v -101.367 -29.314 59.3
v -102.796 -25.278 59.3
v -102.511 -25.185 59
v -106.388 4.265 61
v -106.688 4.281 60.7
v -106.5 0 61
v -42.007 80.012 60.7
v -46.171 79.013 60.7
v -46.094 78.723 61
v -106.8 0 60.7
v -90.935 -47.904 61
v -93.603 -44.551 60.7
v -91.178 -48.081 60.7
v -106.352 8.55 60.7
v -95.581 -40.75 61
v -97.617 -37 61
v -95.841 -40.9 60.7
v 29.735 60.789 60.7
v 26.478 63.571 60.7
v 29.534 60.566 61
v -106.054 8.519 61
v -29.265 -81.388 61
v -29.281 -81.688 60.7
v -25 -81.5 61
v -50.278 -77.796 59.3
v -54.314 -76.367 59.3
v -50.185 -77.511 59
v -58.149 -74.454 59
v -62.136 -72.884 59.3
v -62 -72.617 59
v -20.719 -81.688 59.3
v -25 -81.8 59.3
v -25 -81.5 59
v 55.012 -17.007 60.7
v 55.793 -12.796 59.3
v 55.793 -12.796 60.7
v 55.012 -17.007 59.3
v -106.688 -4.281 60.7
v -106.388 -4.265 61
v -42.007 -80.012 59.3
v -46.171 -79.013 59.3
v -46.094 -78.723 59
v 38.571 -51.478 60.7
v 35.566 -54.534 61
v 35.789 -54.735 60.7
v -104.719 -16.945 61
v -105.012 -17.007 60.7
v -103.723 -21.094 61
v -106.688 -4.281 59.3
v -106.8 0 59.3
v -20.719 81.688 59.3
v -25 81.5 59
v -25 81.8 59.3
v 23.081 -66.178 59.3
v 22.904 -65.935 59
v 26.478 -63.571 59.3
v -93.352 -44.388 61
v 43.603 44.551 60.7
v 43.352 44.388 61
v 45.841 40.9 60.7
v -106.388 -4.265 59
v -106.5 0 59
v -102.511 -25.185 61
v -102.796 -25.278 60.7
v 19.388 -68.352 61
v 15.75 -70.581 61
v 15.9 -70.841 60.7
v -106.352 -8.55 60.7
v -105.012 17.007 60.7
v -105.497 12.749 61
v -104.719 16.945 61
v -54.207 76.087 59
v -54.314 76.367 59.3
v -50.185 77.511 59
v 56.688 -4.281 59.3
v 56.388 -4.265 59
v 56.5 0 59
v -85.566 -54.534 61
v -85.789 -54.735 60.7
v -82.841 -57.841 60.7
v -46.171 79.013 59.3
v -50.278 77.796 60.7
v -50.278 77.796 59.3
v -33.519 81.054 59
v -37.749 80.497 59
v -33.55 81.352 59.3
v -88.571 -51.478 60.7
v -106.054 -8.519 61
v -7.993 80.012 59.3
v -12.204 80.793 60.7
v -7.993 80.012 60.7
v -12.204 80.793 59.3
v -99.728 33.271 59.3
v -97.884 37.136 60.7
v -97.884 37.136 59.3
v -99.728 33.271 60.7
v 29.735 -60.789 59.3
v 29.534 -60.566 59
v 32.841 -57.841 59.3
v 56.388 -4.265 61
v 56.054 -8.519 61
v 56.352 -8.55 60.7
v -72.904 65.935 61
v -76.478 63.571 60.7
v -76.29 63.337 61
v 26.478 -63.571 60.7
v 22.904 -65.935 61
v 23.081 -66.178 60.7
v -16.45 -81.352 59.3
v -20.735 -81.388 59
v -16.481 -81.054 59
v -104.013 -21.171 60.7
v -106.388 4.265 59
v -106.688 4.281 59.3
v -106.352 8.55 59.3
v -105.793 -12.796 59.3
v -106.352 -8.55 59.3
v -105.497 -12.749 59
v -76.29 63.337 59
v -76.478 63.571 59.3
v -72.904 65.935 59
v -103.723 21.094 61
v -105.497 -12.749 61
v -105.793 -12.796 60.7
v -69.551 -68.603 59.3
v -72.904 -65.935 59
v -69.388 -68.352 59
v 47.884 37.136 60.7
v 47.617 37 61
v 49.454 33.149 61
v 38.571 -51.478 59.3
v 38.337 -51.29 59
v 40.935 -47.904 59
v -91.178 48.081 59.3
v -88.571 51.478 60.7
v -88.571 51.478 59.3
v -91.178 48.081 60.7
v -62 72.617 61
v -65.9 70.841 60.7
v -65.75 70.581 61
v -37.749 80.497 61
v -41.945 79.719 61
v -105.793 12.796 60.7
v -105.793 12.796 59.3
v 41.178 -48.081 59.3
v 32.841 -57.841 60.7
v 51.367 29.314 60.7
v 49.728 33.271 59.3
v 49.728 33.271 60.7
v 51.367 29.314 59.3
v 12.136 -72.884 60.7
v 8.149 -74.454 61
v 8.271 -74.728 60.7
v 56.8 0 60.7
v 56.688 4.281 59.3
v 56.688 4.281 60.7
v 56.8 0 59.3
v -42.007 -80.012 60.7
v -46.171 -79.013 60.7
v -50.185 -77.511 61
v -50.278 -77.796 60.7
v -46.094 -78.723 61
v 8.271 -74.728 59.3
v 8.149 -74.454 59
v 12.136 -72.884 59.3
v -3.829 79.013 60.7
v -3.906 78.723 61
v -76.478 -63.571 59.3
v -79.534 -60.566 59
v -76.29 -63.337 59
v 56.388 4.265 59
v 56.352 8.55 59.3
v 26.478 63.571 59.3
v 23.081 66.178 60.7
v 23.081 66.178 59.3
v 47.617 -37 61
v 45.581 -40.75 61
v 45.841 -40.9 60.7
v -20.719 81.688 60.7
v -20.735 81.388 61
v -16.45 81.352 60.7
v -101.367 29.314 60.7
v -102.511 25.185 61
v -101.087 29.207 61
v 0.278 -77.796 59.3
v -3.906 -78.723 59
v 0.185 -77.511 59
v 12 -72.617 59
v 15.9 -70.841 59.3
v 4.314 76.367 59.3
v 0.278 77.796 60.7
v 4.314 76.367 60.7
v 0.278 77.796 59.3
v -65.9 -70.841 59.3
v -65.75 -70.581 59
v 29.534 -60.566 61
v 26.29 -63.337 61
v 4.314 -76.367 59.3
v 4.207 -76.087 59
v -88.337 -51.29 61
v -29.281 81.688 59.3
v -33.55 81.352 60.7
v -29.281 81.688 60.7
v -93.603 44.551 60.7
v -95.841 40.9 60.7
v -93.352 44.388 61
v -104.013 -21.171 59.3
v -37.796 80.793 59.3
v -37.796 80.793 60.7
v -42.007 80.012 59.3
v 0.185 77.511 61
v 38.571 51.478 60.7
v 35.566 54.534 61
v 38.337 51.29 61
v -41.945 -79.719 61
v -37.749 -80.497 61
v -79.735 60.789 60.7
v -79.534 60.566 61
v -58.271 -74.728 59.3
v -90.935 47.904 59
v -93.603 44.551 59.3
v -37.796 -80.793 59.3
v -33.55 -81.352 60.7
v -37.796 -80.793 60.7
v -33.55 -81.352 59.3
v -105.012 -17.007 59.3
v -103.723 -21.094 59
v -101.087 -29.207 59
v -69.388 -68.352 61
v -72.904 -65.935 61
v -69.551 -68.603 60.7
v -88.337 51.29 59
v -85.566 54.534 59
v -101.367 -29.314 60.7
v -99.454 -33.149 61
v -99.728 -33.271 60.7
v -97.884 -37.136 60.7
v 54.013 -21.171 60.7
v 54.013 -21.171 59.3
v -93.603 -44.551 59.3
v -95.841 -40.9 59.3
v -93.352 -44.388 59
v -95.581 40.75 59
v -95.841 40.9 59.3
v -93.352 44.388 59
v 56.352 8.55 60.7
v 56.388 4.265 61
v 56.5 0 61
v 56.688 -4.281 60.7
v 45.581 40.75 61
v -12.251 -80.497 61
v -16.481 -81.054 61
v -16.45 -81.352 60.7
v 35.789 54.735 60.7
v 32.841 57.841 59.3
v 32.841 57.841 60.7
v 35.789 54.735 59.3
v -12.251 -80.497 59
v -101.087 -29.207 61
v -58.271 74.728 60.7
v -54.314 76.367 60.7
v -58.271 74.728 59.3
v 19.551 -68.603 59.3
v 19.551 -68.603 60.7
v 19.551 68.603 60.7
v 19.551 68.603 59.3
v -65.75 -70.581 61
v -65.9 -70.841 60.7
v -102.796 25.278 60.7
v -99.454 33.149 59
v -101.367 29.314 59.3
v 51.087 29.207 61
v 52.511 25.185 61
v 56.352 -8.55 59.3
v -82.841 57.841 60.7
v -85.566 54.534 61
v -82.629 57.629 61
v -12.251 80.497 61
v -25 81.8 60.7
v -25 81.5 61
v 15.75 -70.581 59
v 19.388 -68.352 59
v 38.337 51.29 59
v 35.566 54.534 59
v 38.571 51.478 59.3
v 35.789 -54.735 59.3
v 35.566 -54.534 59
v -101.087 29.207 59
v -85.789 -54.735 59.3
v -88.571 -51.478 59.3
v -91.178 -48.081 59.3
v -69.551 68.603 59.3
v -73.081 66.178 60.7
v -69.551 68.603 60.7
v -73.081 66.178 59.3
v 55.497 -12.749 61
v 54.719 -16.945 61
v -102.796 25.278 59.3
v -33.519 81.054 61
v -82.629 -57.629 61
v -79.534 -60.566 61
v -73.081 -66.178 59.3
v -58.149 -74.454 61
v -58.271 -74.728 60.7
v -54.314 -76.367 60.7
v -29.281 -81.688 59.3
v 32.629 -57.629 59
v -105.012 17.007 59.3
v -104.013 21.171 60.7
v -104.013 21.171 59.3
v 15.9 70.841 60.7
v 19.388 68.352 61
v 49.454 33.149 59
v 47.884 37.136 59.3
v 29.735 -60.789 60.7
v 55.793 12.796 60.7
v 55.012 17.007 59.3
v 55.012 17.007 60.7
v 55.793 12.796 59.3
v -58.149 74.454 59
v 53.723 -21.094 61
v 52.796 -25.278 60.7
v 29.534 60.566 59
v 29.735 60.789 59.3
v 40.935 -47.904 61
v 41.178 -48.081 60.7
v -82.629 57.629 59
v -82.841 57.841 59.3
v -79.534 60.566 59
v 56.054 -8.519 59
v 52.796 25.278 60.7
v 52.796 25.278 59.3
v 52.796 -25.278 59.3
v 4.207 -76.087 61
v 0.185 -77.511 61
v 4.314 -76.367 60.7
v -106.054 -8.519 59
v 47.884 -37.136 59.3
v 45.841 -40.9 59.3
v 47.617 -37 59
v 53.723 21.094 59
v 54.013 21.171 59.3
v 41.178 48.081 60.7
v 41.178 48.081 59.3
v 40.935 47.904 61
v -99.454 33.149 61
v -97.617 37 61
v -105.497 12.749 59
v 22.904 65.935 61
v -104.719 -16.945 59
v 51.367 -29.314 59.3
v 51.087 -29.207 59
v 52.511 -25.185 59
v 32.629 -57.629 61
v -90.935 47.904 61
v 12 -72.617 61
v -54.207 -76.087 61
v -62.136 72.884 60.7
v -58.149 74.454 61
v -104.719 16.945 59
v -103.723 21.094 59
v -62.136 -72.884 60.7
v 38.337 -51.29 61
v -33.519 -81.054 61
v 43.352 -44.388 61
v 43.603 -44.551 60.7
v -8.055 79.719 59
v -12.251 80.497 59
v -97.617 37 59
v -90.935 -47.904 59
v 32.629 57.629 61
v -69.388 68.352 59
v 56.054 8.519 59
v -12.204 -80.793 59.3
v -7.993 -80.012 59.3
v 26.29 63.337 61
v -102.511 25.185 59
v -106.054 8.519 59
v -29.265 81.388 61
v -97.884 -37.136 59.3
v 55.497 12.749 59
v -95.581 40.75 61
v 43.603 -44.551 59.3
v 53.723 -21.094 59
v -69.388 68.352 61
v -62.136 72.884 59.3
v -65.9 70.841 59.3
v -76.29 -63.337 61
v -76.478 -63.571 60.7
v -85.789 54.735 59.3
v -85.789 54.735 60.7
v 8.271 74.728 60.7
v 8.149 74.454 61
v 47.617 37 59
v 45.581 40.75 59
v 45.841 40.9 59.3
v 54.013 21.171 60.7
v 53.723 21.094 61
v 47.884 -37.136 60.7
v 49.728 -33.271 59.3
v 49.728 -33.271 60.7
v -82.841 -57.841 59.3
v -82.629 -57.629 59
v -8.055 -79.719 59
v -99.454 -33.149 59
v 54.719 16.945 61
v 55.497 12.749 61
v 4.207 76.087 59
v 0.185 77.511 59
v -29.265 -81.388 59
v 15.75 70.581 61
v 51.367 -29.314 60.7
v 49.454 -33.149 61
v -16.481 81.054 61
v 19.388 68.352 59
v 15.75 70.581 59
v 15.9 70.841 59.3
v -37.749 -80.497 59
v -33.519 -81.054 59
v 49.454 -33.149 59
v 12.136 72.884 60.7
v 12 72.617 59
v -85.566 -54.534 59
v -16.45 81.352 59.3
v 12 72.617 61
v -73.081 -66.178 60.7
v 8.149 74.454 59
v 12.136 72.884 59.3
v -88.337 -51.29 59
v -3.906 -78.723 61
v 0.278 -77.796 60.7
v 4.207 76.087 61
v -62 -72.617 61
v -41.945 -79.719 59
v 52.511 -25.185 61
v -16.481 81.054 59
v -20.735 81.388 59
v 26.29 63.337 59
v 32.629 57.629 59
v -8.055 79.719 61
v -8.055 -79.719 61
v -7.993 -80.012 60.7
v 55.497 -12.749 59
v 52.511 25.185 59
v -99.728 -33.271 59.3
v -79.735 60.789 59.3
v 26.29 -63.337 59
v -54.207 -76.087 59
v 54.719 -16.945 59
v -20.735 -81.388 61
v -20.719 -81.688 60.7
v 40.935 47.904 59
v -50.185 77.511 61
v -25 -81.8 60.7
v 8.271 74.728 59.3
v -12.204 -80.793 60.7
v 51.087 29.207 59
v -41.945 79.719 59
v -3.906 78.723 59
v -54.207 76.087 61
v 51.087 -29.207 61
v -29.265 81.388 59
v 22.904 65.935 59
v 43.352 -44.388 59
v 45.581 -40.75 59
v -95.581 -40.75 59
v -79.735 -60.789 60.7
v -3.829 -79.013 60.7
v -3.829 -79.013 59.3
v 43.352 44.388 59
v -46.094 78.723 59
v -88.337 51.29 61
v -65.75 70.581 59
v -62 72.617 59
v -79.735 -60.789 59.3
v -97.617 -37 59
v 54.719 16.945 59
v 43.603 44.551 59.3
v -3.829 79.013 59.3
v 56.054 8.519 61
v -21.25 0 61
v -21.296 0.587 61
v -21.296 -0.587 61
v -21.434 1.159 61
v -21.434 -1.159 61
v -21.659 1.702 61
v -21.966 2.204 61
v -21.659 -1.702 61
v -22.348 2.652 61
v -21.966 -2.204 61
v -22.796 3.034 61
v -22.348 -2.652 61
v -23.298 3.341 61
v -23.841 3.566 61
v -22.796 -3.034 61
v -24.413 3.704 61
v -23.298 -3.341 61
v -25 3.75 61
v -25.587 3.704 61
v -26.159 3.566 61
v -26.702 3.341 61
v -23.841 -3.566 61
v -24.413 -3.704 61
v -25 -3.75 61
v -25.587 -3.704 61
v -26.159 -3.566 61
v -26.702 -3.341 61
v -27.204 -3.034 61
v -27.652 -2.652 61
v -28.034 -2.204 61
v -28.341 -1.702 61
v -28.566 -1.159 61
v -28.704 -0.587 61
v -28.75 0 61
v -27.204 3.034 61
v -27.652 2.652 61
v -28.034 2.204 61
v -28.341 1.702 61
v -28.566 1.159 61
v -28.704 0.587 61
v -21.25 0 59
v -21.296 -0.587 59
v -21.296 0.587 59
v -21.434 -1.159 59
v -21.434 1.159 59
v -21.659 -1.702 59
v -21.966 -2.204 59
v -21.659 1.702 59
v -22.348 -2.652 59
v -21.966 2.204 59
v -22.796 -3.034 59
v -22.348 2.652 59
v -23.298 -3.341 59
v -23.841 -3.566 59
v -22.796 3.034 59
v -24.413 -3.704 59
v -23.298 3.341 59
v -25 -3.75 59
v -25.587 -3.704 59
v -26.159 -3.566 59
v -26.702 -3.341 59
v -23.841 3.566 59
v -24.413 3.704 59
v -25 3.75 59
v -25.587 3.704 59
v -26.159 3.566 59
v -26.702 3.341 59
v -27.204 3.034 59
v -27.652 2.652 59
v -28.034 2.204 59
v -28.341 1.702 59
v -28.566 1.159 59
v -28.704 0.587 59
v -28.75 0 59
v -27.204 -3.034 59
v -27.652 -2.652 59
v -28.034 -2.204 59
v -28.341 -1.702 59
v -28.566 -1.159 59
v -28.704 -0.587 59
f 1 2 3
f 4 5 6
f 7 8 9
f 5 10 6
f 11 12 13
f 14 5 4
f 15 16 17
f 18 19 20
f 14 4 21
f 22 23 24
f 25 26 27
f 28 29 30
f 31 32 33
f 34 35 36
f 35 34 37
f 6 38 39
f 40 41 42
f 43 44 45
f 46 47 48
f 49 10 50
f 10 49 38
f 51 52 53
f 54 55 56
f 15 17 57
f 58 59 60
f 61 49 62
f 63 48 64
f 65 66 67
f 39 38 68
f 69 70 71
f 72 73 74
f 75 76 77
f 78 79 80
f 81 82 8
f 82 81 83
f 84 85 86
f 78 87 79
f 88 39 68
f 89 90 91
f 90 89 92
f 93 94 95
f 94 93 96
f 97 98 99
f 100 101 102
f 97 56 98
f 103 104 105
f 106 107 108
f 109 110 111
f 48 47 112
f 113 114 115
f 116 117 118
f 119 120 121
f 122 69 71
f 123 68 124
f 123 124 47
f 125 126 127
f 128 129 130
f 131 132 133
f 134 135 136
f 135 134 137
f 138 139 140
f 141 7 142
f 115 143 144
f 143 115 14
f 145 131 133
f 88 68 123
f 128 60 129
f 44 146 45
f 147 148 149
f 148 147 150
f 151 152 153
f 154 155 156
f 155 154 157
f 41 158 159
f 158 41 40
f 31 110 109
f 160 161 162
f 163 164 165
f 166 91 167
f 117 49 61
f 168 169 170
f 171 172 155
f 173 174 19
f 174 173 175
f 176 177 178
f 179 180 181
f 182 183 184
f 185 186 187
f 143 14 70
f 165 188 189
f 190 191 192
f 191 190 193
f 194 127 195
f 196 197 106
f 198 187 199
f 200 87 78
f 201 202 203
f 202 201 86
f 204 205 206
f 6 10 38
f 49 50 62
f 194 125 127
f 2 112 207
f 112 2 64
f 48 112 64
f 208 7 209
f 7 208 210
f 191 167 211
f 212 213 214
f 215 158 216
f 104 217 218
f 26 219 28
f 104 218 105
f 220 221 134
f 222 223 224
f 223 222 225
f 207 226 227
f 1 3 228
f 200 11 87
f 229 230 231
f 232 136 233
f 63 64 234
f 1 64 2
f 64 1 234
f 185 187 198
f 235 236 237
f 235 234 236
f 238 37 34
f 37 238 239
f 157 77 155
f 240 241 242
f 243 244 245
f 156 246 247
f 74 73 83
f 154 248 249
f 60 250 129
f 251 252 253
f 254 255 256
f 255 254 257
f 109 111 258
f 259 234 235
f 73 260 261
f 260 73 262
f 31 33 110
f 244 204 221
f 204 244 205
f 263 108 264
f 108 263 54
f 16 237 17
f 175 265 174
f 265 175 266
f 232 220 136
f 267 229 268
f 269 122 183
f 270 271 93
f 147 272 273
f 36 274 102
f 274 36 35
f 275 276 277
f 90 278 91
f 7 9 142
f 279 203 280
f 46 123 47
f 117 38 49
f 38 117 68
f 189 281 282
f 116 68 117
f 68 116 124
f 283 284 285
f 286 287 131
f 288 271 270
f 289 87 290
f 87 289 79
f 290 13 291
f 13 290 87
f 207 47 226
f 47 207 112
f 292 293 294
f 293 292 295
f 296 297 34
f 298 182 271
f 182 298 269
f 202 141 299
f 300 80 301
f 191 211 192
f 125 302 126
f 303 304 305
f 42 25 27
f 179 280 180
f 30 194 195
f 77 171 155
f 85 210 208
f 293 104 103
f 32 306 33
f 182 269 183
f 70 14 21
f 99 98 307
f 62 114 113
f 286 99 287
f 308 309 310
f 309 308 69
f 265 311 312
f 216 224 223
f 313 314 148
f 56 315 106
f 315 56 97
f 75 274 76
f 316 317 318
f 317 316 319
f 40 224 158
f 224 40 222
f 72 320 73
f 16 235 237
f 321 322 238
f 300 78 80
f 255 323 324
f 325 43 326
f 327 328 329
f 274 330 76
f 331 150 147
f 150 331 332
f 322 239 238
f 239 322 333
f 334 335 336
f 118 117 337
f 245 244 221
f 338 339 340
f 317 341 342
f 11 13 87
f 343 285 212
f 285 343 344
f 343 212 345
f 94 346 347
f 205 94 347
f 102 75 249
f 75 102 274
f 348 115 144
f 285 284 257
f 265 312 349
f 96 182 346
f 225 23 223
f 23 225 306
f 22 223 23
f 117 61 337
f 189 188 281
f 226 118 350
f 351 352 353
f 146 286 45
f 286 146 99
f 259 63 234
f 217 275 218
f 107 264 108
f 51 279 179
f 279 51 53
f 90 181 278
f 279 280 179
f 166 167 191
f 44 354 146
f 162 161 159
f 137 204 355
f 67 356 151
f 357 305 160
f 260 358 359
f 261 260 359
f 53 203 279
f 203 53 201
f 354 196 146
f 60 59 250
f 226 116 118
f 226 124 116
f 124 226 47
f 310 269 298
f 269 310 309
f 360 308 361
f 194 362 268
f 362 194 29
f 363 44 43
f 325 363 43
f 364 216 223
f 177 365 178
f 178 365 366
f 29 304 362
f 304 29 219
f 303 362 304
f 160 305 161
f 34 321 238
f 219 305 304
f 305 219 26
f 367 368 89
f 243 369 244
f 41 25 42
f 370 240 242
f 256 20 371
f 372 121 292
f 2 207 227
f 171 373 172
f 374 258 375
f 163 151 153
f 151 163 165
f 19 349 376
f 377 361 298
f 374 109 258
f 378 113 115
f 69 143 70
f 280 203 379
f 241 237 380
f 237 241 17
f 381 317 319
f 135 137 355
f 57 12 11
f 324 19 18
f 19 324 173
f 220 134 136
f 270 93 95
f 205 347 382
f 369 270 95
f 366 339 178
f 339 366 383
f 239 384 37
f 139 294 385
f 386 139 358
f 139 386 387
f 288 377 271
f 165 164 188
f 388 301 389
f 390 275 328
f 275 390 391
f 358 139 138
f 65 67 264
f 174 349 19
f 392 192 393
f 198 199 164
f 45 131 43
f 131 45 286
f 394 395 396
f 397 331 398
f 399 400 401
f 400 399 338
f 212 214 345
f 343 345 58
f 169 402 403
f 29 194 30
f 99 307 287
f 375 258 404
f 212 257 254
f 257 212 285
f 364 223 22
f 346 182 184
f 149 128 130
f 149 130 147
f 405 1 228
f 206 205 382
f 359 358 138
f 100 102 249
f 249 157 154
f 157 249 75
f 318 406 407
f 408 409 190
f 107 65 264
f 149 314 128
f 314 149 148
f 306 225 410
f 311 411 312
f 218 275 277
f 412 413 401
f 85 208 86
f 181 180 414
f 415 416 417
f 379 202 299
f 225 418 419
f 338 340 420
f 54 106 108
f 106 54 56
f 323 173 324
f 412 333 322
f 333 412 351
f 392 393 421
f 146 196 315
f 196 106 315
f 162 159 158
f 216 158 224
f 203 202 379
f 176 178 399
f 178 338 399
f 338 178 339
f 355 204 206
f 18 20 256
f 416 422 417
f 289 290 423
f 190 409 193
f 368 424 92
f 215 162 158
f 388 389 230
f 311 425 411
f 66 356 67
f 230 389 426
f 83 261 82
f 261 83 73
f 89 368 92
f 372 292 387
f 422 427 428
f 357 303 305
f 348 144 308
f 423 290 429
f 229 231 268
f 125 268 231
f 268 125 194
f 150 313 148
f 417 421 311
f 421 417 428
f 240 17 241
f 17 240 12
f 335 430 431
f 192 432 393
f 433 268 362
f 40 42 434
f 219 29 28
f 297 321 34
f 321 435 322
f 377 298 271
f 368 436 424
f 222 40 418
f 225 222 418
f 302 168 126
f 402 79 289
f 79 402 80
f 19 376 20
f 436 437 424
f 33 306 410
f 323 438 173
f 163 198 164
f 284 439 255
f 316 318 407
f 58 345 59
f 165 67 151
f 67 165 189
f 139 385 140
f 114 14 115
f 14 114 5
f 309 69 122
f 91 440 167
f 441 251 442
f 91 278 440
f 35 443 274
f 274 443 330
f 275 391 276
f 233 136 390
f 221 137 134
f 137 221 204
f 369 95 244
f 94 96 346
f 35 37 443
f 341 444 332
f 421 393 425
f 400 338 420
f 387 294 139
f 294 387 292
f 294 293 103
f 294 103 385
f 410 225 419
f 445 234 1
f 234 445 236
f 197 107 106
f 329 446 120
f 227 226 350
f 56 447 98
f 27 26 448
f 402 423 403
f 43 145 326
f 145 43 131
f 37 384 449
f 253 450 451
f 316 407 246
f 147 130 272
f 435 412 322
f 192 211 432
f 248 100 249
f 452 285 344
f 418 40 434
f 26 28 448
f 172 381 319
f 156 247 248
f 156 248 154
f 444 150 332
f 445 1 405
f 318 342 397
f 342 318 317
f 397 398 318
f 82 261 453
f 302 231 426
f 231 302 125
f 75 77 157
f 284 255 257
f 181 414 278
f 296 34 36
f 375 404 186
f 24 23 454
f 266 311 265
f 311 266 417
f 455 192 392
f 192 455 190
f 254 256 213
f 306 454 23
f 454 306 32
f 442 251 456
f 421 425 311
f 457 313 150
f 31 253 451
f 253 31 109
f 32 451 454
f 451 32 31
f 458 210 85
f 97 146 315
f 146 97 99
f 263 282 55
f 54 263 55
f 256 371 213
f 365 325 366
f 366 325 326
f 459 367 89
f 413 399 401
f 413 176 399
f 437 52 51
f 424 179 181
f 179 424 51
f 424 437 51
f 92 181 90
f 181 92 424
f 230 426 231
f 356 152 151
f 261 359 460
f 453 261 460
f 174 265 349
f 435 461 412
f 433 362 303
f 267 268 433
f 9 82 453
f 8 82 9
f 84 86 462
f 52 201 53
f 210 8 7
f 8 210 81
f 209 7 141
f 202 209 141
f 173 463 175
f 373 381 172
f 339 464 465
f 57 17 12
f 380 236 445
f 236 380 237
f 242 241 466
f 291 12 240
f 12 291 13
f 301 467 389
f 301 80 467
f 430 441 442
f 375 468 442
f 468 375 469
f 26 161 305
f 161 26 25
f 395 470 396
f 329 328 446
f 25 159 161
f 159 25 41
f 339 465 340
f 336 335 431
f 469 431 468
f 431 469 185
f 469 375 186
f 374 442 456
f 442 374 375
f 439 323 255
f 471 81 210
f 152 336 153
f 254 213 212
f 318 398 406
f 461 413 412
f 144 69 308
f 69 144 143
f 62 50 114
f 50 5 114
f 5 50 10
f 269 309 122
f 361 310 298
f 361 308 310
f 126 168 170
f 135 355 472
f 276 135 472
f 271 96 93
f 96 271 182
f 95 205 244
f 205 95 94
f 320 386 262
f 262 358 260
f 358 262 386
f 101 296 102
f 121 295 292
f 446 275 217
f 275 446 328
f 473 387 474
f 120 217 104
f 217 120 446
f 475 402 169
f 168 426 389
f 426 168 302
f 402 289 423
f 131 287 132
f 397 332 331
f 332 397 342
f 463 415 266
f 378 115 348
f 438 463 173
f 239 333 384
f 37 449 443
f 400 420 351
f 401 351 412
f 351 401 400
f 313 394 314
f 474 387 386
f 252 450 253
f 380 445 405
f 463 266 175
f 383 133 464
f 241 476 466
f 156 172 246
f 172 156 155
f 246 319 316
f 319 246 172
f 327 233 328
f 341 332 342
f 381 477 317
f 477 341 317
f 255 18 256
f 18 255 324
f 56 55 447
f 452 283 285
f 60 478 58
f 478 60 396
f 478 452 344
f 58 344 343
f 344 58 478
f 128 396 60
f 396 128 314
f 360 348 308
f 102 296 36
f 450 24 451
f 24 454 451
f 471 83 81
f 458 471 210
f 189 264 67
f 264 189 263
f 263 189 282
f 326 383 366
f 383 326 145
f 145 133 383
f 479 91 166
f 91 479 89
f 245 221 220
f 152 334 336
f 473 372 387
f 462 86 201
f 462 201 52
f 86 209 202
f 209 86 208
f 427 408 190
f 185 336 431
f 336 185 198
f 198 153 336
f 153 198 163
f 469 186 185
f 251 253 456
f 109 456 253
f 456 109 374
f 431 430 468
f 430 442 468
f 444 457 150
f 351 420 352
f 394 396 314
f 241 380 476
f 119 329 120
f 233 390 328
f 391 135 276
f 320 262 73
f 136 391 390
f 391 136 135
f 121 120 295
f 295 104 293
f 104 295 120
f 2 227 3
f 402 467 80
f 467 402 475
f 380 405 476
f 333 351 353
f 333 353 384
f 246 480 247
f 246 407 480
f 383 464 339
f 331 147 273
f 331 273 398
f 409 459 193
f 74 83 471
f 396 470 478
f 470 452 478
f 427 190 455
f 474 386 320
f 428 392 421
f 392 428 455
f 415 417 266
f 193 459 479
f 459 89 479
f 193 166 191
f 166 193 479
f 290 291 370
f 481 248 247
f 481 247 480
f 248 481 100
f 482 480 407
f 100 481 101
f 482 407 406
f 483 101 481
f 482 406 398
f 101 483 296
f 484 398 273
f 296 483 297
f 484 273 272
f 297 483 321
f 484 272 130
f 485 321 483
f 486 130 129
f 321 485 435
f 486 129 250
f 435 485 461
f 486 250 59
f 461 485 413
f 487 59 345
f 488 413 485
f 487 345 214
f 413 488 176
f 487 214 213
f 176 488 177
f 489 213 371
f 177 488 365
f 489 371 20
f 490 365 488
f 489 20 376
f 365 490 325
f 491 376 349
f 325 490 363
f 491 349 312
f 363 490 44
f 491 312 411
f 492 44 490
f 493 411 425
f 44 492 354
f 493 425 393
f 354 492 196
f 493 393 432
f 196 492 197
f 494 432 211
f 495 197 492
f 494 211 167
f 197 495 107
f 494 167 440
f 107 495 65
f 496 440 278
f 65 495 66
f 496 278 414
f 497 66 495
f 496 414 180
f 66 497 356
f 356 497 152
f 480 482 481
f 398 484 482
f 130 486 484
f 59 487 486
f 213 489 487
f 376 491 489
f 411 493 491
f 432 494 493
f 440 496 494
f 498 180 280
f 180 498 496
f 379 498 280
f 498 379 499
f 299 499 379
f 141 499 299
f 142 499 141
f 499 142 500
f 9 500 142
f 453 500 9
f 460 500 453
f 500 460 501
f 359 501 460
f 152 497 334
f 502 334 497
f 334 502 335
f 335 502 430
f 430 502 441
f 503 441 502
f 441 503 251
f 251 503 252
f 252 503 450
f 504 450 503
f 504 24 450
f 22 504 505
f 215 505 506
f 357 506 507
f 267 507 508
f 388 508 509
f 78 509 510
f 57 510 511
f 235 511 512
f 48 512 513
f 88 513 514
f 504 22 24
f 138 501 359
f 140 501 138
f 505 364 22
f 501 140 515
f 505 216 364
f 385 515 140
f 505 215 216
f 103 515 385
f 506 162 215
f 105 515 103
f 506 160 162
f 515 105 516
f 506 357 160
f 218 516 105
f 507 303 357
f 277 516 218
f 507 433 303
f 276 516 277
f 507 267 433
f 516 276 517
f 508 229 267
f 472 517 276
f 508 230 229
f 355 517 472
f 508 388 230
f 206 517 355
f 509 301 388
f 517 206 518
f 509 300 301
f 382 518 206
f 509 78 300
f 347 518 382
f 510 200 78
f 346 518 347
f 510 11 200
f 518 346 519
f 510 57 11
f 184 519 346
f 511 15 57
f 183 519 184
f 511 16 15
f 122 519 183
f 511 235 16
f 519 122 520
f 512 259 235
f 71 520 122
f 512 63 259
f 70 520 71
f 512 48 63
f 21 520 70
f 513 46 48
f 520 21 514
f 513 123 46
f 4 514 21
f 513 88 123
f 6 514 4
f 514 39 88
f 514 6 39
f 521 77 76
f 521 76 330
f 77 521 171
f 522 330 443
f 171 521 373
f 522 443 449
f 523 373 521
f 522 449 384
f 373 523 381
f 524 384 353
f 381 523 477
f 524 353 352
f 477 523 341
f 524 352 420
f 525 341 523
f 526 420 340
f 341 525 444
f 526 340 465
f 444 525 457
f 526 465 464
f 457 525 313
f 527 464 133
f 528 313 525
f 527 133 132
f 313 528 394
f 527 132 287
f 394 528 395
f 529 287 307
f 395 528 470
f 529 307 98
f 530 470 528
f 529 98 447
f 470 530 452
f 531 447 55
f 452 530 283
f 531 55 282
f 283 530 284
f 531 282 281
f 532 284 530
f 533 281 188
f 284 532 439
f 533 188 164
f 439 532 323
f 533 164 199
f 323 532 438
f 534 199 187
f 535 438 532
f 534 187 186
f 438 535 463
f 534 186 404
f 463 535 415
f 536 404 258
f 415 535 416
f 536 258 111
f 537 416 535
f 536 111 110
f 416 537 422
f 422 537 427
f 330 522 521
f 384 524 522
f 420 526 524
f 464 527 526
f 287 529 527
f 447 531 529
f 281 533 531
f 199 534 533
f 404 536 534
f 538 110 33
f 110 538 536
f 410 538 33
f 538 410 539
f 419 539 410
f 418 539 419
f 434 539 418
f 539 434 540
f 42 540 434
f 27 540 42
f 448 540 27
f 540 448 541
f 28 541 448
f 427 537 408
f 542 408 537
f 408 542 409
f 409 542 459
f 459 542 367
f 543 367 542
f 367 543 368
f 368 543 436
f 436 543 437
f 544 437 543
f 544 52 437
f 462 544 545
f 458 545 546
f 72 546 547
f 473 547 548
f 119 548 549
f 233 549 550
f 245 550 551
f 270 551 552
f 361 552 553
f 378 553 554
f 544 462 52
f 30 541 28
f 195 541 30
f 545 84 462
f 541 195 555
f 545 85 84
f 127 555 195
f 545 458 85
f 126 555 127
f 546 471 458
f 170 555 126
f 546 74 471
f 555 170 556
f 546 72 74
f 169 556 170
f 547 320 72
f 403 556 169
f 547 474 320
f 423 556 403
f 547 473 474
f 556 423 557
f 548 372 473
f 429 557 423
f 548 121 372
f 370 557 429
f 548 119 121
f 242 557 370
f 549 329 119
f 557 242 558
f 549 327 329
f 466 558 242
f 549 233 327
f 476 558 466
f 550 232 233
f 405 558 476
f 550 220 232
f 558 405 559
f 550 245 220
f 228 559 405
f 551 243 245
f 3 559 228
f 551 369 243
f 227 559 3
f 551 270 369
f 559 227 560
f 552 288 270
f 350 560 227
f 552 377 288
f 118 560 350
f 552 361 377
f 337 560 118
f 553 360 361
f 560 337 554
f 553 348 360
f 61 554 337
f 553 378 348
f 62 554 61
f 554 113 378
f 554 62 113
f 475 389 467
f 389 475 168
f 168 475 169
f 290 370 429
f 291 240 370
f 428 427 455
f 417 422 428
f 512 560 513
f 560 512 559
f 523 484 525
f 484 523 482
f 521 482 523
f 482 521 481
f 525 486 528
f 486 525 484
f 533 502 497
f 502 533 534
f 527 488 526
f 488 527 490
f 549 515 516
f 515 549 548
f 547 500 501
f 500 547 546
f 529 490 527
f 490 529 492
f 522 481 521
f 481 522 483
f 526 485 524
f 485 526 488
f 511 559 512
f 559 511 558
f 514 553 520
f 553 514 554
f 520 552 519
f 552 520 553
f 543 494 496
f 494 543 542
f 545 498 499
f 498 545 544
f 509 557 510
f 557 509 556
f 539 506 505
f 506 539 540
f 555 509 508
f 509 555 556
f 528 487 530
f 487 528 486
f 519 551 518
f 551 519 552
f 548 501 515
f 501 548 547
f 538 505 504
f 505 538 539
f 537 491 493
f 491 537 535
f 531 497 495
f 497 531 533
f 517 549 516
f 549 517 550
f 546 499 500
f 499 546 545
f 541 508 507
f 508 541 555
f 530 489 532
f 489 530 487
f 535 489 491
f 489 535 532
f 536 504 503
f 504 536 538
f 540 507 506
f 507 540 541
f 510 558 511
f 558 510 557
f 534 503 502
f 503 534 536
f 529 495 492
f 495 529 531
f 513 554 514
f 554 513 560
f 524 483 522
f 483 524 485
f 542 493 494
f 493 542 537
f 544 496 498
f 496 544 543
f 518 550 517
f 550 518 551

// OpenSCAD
// file: ../lib/common.scad
// ============================================================================
//  Вспомогательные модули общего назначения.
//  Подключать через use <lib/common.scad> — файл не содержит параметров
//  проекта и ни от чего не зависит.
// ============================================================================

_eps = 0.01;

// --------------------------------------------------------------------- 2D ---
// Прямоугольник со скруглёнными углами, по центру
module rrect(w, d, r) {
    rr = min(r, w/2 - _eps, d/2 - _eps);
    if (rr > 0) offset(r = rr) square([w - 2*rr, d - 2*rr], center = true);
    else square([w, d], center = true);
}

// --------------------------------------------------------------------- 3D ---
// Коробка со скруглением ТОЛЬКО вертикальных рёбер: нижние и верхние острые
module rounded_box(w, d, h, r) linear_extrude(height = h) rrect(w, d, r);

// Цилиндр с фасками на торцах (снимает «слоновью ногу» и облегчает посадку)
module chamfered_cyl(d, h, ch = 0.6, bottom = true, top = true) {
    r  = d/2;
    cb = bottom ? min(ch, h/2) : 0;
    ct = top    ? min(ch, h/2) : 0;
    if (cb <= 0 && ct <= 0) cylinder(d = d, h = h);
    else rotate_extrude(angle = 360) polygon(concat(
        [[0, 0]],
        cb > 0 ? [[r - cb, 0], [r, cb]] : [[r, 0]],
        ct > 0 ? [[r, h - ct], [r - ct, h]] : [[r, h]],
        [[0, h]]));
}

// Труба
module tube(od, id, h) difference() {
    cylinder(d = od, h = h);
    translate([0, 0, -_eps]) cylinder(d = id, h = h + 2*_eps);
}

// Сквозное отверстие, растянутое вверх-вниз для гарантированного вычитания
module thru(d, h) translate([0, 0, -_eps]) cylinder(d = d, h = h + 2*_eps);

// Потайное отверстие под саморез с конической головкой.
// Пластина занимает z = [0 .. t], головка утапливается сверху,
// саморез идёт вниз (в ответную стойку).
module countersunk_hole(free_d, head_d, t, down = 30) {
    cone_h = (head_d - free_d)/2;    // головка 90 градусов
    union() {
        translate([0, 0, -down]) cylinder(d = free_d, h = down + t - cone_h + _eps);
        translate([0, 0, t - cone_h]) cylinder(d1 = free_d, d2 = head_d, h = cone_h);
    }
}

// Паз (щелевое отверстие) длиной len по X, сквозной по высоте h
module slot(len, d, h) hull() for (s = [-1, 1])
    translate([s*(len - d)/2, 0, 0]) cylinder(d = d, h = h);

// Стойка под саморез: цилиндр с пилотным отверстием сверху.
// Снизу фаски нет — стойка растёт из дна детали.
module screw_boss(od, h, pilot_d, pilot_depth, ch = 0.6) difference() {
    chamfered_cyl(od, h, ch = ch, bottom = false, top = true);
    translate([0, 0, h - pilot_depth]) cylinder(d = pilot_d, h = pilot_depth + _eps);
}

// Треугольная косынка в плоскости XZ (катеты l по X и h по Z), толщина t по Y
module gusset(l, h, t) translate([0, -t/2, 0]) linear_extrude(height = t)
    polygon([[0, 0], [l, 0], [0, h]]);

// Конусное гнездо под заточенный винт-ось (ось Z вниз от z=0)
module cone_seat(d, depth) translate([0, 0, -depth])
    cylinder(d1 = 0.2, d2 = d, h = depth + _eps);

// Канавка под круглый пассик: тор, вычитаемый из обода
module belt_groove(pulley_d, groove_r) rotate_extrude(angle = 360)
    translate([pulley_d/2, 0]) circle(r = groove_r);

// Сетка облегчающих отверстий по кругу
module radial_holes(n, r, d, h) for (i = [0 : n - 1])
    rotate([0, 0, i*360/n]) translate([r, 0, 0]) thru(d, h);
// main file
// ============================================================================
//  МАТ НА ДИСК — печатный из TPU
//
//  Лежит в утоплении диска (1 мм) и выступает над ним на оставшийся
//  миллиметр: пластинка не касается жёсткого PLA. Центр — отверстие под
//  штырь 7.1 мм. Зазоры mat_od_clr / mat_hole_clr, потому что TPU
//  размерно «плывёт» сильнее обычного пластика.
//
//  Печать: TPU 95A, перевернуть — рабочей плоскостью на стол (она будет
//  гладкой под пластинку). 2-3 периметра, infill 15-20%, без поддержек.
// ============================================================================

include <../params.scad>
use <../lib/common.scad>

module mat() {
    translate([platter_pos[0], platter_pos[1],
               platter_top_z - platter_mat_recess]) difference() {
        chamfered_cyl(platter_mat_d - mat_od_clr, mat_t, ch = 0.3);
        thru(spindle_tip_d + mat_hole_clr, mat_t);
    }
}

mat();
